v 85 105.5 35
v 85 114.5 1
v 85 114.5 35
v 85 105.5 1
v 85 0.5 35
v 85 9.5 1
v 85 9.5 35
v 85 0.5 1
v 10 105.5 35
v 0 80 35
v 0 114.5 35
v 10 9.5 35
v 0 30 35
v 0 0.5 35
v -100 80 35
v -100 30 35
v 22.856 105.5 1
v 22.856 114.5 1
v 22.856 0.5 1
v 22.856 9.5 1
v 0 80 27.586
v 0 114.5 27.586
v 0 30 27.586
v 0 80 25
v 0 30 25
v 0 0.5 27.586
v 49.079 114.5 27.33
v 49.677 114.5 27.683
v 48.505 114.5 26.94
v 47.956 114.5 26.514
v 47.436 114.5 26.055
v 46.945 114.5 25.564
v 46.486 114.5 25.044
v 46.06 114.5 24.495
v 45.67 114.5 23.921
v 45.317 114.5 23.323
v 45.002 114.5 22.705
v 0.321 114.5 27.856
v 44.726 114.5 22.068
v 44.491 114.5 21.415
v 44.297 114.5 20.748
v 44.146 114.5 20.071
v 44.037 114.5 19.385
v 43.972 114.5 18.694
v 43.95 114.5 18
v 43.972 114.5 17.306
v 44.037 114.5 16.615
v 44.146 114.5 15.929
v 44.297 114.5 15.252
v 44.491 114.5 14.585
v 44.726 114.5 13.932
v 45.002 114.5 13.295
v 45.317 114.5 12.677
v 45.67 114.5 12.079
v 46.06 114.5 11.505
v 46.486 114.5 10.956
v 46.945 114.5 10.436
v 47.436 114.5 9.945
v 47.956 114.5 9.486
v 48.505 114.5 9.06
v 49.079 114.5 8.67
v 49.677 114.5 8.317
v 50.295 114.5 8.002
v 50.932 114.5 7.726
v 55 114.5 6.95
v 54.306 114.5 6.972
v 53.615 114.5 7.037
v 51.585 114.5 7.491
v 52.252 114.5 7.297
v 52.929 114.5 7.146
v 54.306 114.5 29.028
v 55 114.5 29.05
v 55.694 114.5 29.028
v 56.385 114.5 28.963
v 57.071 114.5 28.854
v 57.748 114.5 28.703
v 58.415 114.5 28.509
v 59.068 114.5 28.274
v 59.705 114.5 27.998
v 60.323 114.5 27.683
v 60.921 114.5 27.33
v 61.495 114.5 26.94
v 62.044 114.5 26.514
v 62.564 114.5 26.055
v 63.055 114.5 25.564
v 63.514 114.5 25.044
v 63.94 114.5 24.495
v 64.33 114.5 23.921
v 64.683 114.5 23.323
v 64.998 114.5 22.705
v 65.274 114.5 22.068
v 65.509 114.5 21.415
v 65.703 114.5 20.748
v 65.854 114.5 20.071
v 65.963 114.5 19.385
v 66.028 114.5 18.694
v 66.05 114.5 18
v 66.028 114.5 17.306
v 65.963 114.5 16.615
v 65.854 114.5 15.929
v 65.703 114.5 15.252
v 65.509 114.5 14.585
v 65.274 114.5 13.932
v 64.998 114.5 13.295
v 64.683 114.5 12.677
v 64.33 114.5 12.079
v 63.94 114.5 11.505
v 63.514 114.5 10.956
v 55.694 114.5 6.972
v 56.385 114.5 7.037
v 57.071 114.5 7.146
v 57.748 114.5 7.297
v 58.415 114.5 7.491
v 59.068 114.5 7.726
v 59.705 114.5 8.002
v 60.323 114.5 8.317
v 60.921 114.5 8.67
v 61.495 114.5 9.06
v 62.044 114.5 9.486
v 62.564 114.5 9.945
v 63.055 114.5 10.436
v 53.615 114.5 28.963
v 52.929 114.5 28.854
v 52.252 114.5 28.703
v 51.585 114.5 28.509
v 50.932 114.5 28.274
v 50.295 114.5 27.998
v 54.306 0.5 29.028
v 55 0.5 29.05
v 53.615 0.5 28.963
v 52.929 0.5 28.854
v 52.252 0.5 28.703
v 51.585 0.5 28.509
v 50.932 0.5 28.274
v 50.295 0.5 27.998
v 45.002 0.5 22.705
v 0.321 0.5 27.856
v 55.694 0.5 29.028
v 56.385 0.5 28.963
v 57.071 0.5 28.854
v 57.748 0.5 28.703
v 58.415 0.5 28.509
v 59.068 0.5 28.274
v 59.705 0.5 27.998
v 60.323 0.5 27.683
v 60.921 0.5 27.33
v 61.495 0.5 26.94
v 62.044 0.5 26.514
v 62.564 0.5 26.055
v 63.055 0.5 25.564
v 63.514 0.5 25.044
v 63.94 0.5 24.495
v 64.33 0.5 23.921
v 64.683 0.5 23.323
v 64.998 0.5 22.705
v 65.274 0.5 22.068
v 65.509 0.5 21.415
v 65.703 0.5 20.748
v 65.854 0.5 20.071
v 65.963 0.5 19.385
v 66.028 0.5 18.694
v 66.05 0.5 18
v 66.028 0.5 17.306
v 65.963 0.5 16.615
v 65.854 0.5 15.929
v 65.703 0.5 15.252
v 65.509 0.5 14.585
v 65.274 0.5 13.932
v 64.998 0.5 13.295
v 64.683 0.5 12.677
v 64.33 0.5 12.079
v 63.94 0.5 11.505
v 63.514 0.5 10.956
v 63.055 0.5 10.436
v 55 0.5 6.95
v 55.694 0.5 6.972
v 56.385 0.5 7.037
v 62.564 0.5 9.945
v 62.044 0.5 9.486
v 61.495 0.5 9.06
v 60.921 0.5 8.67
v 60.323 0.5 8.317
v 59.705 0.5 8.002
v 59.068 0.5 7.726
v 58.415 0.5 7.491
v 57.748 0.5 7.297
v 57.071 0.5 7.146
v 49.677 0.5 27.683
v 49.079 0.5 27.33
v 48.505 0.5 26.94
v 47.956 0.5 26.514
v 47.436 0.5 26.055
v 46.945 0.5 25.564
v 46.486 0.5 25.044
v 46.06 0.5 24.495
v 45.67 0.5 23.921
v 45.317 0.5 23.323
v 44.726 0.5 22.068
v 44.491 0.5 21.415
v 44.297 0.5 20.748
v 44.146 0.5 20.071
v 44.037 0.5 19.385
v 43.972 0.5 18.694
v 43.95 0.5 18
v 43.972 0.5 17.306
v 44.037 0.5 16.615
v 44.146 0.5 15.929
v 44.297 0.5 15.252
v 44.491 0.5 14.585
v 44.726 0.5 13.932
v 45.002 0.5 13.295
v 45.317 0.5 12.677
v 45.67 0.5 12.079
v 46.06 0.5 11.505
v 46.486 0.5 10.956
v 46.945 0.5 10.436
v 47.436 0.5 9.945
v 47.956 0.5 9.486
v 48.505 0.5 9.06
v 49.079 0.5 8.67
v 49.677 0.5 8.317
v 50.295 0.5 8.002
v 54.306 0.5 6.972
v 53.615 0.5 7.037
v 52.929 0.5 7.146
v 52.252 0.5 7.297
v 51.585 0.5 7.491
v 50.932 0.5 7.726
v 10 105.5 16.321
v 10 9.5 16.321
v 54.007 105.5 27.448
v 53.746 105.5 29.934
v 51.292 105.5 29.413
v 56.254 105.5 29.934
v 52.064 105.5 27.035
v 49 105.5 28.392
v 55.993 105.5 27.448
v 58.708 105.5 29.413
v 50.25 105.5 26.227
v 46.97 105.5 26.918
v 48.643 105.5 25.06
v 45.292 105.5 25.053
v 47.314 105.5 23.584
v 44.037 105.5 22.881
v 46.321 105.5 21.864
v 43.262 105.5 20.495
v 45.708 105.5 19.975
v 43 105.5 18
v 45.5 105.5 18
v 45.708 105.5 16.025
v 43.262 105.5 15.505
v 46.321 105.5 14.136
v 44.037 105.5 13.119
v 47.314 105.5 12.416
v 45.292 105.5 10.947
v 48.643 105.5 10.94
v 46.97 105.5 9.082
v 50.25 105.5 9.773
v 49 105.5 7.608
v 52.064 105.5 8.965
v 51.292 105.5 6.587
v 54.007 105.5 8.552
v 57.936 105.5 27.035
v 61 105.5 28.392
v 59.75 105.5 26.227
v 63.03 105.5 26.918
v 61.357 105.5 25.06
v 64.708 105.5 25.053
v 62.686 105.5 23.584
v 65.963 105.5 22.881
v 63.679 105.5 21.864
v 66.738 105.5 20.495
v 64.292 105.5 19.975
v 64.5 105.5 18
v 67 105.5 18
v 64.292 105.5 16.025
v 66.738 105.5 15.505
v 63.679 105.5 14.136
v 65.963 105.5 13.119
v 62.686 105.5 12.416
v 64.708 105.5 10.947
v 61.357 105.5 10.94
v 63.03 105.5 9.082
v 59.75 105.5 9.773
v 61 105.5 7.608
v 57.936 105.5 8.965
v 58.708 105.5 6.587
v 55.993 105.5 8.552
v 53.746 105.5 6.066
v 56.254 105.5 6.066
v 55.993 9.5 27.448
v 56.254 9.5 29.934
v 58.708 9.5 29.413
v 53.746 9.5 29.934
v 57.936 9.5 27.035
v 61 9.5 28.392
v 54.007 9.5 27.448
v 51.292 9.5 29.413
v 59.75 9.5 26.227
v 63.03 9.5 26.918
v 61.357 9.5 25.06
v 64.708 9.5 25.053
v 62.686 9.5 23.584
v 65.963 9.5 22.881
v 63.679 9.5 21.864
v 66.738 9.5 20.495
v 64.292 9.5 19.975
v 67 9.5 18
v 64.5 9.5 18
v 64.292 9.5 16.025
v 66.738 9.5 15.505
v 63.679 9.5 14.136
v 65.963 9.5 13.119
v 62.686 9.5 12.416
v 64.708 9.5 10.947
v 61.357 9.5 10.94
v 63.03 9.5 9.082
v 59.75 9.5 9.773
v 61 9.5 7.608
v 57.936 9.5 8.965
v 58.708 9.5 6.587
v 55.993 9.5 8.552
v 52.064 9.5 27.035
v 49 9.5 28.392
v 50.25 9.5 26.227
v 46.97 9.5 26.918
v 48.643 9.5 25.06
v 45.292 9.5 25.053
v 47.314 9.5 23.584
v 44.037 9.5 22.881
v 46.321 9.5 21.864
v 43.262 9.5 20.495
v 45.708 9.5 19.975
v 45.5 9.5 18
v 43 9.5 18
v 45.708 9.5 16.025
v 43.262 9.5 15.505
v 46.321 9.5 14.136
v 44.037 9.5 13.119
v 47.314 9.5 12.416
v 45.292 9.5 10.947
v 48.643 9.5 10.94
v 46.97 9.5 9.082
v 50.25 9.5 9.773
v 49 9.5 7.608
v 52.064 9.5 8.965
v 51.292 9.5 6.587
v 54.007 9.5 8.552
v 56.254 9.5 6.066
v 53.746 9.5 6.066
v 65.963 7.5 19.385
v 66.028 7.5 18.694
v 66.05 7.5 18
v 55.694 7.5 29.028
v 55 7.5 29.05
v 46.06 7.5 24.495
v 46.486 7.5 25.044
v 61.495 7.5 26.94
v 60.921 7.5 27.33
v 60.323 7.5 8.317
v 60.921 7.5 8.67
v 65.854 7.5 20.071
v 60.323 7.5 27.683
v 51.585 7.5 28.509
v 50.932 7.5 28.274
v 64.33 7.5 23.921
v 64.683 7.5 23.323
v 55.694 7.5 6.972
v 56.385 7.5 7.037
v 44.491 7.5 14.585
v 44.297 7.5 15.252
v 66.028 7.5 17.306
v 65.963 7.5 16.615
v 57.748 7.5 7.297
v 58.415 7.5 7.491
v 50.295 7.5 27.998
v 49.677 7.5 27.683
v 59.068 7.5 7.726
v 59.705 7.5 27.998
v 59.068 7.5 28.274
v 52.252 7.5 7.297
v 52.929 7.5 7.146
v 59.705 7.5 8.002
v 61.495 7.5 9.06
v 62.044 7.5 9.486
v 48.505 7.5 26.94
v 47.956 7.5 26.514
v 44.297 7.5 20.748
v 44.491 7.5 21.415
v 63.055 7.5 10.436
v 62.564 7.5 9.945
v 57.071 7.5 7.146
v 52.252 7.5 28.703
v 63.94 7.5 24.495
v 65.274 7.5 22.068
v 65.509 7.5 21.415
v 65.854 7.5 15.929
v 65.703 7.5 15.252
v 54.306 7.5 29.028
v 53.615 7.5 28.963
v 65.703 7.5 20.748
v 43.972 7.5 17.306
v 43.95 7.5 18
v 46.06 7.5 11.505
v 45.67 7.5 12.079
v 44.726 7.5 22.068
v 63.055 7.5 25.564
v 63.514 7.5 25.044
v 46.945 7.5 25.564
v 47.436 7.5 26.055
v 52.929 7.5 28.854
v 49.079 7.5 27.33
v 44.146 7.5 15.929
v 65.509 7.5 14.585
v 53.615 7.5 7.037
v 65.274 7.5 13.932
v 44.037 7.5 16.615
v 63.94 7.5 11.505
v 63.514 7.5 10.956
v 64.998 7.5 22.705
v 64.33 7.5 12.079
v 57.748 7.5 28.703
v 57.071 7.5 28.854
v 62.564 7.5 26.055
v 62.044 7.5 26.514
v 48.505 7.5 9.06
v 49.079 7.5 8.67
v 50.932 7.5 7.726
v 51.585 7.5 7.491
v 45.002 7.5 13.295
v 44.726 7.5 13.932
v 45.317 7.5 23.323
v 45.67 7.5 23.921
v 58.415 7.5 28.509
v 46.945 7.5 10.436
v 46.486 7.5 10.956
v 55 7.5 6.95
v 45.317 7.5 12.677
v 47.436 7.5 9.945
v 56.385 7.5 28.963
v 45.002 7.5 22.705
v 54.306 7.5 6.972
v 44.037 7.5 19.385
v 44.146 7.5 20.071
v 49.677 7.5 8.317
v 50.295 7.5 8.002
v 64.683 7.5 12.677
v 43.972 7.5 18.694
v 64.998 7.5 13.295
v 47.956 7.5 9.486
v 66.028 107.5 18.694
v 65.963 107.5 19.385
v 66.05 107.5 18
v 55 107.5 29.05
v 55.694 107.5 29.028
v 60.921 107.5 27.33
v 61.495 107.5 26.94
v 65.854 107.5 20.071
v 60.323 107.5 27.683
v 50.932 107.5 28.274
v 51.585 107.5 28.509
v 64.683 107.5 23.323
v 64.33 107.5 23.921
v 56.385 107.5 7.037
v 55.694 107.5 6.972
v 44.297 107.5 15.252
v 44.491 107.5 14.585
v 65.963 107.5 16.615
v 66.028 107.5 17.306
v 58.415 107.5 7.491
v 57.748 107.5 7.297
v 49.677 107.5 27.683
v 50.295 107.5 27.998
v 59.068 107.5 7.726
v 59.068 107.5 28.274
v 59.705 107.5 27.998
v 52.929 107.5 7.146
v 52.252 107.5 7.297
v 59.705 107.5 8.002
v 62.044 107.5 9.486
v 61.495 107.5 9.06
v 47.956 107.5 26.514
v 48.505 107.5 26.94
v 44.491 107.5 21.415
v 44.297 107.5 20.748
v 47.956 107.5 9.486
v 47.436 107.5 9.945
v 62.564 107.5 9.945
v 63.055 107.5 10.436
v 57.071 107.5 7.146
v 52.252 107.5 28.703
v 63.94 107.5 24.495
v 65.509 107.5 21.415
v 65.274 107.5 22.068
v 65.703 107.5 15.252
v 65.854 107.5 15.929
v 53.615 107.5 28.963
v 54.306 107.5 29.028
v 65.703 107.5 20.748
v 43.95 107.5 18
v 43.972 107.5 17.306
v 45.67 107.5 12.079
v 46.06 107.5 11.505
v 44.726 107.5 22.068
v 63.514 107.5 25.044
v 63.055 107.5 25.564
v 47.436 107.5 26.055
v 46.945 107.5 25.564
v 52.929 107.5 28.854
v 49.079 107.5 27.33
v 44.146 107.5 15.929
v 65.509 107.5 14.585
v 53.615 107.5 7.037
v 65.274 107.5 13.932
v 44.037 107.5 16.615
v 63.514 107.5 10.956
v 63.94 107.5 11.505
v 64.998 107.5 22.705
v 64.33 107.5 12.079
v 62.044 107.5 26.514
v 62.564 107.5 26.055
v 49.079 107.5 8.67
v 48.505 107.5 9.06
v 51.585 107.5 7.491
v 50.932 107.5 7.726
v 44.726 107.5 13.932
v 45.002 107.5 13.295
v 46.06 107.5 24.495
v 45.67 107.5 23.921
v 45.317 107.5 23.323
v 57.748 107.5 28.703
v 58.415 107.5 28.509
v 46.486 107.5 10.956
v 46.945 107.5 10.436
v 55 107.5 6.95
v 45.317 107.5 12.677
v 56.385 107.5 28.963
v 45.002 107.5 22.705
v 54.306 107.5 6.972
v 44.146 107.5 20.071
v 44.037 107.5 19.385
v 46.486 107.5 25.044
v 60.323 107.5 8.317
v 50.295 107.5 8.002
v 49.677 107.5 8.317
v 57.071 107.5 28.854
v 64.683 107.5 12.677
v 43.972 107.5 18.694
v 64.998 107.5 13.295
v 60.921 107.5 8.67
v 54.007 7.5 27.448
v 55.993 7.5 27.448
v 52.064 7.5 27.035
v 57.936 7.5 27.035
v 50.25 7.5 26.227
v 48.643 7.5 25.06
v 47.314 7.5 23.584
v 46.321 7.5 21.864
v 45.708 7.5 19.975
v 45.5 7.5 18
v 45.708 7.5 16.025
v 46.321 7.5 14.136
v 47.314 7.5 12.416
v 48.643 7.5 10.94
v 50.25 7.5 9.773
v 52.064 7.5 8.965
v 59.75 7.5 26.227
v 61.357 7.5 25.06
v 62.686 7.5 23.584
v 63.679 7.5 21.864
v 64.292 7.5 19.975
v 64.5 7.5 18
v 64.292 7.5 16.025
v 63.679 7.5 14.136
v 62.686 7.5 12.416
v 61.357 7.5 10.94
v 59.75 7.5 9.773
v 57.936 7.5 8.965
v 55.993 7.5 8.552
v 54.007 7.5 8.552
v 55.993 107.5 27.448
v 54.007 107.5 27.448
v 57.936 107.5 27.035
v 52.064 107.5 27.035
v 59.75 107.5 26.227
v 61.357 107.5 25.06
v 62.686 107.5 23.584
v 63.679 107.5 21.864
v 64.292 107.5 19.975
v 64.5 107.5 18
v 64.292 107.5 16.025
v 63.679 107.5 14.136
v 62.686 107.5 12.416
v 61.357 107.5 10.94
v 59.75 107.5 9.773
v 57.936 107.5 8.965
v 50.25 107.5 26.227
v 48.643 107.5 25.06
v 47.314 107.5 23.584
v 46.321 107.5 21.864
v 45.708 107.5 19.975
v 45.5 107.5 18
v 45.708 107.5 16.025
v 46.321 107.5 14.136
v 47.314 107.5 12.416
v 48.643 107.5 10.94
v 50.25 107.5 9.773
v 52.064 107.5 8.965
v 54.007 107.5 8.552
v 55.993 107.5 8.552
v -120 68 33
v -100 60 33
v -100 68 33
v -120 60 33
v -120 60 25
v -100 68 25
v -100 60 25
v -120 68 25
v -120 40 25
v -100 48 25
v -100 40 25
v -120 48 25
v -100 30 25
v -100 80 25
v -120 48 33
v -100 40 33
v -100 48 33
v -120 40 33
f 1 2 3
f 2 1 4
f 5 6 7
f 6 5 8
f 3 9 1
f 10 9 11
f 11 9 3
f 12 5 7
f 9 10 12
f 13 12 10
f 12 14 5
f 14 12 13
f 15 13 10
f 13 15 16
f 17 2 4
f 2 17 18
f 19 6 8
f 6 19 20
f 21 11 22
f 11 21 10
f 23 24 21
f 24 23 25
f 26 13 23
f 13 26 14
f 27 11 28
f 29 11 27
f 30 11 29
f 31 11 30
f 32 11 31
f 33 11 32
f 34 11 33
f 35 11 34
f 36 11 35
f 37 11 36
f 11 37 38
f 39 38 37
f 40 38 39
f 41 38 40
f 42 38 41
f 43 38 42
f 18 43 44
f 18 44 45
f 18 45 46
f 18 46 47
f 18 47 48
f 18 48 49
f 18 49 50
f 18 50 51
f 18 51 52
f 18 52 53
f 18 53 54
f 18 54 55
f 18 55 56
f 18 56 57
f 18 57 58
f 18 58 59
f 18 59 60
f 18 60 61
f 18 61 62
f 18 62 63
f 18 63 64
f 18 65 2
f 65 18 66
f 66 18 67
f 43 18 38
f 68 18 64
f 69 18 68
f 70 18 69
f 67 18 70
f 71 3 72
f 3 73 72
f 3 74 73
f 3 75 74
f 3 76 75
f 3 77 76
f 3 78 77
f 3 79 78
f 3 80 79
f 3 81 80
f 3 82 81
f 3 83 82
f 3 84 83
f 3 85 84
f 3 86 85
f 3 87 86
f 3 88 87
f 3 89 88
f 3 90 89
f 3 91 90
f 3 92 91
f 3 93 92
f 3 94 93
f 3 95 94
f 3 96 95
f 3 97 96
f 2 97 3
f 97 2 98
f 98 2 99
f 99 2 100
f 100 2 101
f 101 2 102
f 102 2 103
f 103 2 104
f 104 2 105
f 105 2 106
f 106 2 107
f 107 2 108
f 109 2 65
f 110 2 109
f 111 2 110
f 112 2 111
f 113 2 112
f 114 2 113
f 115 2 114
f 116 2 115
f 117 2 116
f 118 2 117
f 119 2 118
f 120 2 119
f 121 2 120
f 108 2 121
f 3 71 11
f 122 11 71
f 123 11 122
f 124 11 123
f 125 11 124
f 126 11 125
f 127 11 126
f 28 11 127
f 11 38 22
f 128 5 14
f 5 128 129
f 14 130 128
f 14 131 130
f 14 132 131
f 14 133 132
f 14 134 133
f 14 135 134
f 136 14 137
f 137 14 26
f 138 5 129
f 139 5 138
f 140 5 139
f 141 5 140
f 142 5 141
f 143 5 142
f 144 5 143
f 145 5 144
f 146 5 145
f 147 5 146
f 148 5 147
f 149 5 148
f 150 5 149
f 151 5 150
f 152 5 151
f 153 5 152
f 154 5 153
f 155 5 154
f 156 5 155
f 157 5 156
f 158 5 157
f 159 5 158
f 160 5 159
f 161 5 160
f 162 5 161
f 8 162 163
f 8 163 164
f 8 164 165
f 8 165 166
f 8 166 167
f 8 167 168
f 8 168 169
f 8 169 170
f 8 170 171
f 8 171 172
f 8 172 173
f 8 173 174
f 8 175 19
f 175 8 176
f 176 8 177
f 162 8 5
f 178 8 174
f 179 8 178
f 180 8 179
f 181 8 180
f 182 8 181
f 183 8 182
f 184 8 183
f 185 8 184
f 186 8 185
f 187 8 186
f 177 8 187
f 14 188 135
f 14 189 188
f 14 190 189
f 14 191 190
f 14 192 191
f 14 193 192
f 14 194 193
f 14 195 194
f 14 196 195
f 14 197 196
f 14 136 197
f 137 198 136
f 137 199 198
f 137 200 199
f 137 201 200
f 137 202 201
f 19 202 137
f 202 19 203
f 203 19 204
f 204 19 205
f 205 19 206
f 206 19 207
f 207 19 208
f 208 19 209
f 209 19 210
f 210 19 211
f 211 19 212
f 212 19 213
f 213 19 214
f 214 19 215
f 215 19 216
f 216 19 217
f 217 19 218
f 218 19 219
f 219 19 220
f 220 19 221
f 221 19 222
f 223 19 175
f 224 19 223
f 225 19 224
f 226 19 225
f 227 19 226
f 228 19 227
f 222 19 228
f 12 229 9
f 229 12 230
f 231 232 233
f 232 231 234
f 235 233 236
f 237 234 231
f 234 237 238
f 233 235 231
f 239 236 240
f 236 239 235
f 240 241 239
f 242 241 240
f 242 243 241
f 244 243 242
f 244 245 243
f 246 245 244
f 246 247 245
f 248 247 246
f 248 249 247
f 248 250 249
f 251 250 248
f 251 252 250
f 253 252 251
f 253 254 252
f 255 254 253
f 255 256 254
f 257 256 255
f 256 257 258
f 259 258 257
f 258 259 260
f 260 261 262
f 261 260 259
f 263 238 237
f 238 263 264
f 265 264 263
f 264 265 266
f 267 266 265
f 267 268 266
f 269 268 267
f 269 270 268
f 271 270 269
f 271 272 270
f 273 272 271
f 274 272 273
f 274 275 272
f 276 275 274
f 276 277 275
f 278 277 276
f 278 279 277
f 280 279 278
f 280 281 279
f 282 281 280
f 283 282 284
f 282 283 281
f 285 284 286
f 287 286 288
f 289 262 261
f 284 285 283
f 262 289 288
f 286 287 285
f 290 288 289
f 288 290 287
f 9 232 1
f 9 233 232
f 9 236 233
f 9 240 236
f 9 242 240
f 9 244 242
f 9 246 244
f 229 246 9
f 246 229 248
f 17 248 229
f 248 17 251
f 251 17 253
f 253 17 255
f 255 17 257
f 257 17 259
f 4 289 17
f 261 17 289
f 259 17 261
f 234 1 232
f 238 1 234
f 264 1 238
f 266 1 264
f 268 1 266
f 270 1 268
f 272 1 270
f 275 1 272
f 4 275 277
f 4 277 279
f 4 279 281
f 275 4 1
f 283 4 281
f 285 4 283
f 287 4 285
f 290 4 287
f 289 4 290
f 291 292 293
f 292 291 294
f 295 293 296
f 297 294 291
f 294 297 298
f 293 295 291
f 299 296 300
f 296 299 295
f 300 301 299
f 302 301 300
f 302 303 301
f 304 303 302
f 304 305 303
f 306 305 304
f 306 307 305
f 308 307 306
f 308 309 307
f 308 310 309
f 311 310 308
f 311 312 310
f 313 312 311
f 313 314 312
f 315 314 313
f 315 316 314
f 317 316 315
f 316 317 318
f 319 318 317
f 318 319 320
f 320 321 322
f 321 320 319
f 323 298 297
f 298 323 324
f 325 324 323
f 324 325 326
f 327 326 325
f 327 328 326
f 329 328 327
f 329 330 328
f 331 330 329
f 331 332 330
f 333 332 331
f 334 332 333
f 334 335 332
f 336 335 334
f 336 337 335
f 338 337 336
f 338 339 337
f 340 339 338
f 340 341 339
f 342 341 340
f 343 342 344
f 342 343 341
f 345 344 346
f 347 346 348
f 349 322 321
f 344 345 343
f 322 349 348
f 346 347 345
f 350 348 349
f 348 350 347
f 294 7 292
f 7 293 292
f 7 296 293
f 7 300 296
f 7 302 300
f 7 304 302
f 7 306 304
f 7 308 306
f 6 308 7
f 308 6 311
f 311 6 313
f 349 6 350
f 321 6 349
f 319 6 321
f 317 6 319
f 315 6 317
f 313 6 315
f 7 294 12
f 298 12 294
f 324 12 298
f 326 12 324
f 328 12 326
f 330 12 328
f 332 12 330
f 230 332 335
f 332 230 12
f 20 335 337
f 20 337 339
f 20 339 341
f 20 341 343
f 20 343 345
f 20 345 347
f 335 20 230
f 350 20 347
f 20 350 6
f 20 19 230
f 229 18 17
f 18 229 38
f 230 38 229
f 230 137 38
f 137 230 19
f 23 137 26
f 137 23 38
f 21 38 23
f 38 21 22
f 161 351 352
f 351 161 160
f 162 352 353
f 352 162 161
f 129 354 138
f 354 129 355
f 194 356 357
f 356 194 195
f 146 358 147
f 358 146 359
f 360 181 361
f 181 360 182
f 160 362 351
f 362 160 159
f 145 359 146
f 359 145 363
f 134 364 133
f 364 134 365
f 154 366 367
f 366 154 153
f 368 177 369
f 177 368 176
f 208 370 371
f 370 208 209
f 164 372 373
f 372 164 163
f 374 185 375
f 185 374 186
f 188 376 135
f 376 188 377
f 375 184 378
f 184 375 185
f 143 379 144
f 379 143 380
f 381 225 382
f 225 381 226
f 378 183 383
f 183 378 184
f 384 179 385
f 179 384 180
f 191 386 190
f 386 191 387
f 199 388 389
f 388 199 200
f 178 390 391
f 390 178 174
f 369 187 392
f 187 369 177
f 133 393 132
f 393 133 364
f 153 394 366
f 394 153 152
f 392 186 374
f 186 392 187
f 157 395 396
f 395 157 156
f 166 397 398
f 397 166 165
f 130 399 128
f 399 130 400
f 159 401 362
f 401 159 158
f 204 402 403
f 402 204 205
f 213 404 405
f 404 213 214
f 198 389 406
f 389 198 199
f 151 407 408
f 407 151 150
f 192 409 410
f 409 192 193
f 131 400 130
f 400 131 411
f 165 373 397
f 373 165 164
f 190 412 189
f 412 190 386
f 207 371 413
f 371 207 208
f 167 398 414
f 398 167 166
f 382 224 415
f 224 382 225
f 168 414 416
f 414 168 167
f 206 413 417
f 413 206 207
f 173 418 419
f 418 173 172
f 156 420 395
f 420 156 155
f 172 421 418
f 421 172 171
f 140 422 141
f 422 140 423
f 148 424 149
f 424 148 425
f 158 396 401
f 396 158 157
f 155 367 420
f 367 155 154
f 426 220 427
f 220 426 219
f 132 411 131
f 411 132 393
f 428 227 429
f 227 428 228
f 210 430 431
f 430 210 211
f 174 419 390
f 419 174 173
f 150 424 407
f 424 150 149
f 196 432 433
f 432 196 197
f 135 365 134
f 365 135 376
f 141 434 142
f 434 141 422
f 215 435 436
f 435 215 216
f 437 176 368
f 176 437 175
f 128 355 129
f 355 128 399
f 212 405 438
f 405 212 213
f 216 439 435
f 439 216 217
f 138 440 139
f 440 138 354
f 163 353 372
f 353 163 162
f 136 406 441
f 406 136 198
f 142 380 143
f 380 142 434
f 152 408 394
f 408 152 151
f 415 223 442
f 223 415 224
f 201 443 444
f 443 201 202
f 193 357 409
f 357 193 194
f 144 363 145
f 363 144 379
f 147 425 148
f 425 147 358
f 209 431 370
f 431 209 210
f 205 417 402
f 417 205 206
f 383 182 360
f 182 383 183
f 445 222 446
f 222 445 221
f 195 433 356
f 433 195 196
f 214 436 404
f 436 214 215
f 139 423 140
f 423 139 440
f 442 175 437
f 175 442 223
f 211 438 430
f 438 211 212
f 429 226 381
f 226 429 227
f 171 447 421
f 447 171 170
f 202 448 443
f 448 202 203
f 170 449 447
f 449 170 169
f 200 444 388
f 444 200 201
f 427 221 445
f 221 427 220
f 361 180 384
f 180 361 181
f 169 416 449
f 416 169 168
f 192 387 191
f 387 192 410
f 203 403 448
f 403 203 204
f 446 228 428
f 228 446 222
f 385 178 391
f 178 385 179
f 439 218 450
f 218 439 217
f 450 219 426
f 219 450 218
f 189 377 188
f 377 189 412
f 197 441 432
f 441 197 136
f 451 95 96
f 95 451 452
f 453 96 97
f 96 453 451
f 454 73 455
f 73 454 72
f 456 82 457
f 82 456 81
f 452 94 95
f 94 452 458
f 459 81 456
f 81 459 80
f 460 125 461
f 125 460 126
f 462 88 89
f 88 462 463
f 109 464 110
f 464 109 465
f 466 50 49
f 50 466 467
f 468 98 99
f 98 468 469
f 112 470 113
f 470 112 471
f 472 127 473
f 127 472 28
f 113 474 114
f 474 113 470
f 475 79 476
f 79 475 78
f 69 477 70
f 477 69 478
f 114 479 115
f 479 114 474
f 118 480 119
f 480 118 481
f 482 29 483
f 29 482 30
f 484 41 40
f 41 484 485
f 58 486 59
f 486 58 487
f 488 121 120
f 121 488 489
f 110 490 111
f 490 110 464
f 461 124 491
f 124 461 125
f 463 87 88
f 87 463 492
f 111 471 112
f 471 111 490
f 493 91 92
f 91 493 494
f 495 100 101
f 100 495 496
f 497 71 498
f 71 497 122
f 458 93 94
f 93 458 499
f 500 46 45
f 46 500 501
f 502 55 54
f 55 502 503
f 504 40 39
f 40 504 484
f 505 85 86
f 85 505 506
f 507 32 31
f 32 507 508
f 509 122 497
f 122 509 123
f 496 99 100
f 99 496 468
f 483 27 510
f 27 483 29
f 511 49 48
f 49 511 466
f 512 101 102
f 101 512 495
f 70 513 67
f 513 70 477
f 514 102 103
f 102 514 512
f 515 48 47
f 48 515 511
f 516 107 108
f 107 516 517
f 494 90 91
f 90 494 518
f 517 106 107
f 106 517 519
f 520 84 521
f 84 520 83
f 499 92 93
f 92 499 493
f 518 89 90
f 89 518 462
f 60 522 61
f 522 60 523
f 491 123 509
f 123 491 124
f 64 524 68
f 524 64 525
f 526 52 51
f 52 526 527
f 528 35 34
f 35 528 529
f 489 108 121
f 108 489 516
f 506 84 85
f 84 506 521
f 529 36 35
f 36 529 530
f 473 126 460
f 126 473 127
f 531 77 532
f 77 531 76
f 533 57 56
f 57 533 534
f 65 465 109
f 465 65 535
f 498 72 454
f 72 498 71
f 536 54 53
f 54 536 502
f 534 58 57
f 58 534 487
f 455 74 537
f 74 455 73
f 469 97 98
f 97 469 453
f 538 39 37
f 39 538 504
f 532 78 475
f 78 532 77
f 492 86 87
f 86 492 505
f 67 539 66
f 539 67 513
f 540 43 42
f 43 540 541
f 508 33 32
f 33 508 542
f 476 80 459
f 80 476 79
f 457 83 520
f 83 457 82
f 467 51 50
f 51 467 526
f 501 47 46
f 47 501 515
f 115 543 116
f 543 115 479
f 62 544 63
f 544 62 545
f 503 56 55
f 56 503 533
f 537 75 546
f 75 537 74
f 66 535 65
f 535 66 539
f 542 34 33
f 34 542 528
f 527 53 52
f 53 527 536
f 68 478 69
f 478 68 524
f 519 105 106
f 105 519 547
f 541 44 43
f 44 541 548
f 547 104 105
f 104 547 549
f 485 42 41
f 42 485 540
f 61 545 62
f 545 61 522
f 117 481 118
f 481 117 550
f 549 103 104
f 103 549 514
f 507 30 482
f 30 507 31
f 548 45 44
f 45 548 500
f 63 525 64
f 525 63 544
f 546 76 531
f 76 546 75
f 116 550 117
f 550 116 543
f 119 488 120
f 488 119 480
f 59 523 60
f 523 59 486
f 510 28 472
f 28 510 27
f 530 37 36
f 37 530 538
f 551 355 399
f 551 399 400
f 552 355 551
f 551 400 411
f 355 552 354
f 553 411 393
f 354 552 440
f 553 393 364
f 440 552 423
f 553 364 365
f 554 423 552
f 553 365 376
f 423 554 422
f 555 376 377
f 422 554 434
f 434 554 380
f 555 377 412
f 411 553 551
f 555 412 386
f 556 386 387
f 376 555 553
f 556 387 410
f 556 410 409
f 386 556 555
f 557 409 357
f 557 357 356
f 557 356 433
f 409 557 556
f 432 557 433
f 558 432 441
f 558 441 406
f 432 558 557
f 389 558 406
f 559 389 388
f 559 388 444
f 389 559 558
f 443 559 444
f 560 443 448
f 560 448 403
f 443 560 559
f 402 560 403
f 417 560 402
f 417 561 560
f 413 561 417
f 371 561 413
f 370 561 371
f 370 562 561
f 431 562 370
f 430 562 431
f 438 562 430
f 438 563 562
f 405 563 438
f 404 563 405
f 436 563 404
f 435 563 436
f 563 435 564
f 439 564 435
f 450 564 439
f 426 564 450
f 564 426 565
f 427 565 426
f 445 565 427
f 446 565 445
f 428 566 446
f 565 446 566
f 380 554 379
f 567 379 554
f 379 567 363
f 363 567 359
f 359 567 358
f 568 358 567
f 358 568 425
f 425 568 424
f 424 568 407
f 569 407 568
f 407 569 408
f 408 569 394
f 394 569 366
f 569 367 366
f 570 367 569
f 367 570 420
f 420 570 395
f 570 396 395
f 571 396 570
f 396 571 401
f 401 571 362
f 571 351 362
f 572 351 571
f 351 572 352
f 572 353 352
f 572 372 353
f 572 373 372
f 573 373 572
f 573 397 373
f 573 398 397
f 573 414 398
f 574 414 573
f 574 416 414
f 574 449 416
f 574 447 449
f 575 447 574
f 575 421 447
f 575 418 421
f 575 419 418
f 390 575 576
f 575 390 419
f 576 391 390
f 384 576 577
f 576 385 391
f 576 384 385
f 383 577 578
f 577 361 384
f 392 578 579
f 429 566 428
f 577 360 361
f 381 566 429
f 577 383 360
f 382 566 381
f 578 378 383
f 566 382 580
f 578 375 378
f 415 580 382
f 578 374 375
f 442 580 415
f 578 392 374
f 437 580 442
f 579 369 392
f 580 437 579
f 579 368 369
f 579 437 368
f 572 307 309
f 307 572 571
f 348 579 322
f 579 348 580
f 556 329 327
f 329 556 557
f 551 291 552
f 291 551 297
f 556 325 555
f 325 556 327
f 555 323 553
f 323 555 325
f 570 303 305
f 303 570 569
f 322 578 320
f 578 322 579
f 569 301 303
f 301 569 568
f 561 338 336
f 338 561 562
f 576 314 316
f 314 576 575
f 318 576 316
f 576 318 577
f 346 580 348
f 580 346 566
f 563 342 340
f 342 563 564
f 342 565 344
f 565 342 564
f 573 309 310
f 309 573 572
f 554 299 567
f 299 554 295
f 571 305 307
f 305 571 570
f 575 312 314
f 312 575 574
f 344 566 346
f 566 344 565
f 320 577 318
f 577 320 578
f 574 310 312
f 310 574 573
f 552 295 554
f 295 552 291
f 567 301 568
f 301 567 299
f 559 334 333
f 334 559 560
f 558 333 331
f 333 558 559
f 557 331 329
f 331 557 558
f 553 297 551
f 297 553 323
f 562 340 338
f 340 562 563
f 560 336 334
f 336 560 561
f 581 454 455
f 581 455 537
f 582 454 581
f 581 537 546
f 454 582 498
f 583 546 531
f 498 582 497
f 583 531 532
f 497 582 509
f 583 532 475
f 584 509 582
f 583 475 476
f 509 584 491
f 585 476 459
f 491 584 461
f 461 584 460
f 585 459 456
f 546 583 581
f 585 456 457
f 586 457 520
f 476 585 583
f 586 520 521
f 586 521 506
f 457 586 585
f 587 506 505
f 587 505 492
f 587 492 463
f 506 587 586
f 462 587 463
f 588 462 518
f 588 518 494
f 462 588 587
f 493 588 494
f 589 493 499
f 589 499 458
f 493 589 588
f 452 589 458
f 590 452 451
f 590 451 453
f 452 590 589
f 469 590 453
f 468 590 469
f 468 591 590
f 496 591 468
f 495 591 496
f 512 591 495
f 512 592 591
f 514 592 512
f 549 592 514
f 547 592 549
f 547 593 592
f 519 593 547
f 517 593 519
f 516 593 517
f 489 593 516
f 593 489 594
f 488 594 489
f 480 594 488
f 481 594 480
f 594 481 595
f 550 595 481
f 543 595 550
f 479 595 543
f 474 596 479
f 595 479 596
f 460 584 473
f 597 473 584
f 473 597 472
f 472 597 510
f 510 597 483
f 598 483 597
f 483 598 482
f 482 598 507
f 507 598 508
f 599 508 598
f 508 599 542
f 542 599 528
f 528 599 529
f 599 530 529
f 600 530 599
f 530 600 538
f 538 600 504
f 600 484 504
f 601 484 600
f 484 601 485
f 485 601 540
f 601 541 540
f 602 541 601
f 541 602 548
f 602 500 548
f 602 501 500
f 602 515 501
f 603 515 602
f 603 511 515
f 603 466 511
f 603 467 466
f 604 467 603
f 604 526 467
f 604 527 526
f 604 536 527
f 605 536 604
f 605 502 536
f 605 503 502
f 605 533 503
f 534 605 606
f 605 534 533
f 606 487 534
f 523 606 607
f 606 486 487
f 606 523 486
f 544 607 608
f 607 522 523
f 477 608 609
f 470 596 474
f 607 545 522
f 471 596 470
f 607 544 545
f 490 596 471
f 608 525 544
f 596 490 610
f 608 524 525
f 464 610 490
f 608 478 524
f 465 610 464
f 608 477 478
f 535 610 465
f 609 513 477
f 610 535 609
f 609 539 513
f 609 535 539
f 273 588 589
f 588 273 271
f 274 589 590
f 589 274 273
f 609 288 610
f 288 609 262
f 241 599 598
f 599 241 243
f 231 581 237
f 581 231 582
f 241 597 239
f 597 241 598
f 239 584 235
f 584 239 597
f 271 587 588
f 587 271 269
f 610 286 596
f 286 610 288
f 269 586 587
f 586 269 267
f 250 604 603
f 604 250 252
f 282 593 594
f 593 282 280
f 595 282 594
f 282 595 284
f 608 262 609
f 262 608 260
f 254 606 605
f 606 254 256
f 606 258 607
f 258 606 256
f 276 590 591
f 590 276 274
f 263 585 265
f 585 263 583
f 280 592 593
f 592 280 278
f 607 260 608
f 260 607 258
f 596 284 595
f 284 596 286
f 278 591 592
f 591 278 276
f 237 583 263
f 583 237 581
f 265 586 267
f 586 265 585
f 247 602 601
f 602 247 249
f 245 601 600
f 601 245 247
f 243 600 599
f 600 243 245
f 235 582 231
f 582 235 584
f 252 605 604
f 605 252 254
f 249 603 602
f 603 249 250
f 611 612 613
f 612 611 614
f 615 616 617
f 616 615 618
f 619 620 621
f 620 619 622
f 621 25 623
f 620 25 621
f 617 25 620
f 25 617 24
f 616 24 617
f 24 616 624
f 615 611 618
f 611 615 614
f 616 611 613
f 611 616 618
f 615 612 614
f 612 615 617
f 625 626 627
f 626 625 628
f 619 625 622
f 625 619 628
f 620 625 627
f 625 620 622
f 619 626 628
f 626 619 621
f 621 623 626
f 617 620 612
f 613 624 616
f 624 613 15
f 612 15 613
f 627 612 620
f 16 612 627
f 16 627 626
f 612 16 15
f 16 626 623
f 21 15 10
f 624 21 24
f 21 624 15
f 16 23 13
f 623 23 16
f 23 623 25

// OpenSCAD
//Need: Holes the size of the bearings
//      Connector between car parts


ScramblerFrontBoard();


//ScramblerBackBoard();

module  ScramblerBackBoard(){
    
    difference(){
    translate([-200,108,0]){
        rotate([0,0,181]){
            ScramblerFrontBoard();
            }
        }
        
   ScramblerFrontBoard();
    }
    
    }

module ScramblerFront()
{
    translate([-120,60,25])
    cube([30,8,8]);
    
    translate([-120,40,25])
        cube([30,8,8]);
    
    
    difference()
    {   
        translate([0,0.5,1]){
        cube([85,114,34]);
        }
        
        translate([10,9.5,-2])
        cube(96,90,155);
        
        translate([-15,00,15]){
            rotate([0,50,0]){
                cube([100,120,20]);
            }
        }
    
        
        translate([55,11,18])
        rotate([90,0,0])
        cylinder(15,11.05,11.05,$fn=100);
        translate([55,116,18])
        rotate([90,0,0])
        cylinder(16,11.05,11.05, $fn=100);
    }
    
    difference()
    {
        translate([55,9.5,18])
        rotate([90,0,0])
        cylinder(2,12,12);
        
        translate([55,11,18])
        rotate([90,0,0])
        cylinder(9,9.5,9.5);
    }
    translate([0,98,0])
    {
    difference()
    {
        translate([55,9.5,18])
        rotate([90,0,0])
        cylinder(2,12,12);
        
        translate([55,11,18])
        rotate([90,0,0])
        cylinder(9,9.5,9.5);
    }
}
    
}
module ScramblerFrontBoard()
{
    ScramblerFront();
    translate([100,0,0])
{
    ScramblerBoard();
}
}

module ScramblerBoard()
{
    translate([-200,30,25])
    {
        cube([100,50,10]);
    }
}
// Bearing size: 22 in diameter
